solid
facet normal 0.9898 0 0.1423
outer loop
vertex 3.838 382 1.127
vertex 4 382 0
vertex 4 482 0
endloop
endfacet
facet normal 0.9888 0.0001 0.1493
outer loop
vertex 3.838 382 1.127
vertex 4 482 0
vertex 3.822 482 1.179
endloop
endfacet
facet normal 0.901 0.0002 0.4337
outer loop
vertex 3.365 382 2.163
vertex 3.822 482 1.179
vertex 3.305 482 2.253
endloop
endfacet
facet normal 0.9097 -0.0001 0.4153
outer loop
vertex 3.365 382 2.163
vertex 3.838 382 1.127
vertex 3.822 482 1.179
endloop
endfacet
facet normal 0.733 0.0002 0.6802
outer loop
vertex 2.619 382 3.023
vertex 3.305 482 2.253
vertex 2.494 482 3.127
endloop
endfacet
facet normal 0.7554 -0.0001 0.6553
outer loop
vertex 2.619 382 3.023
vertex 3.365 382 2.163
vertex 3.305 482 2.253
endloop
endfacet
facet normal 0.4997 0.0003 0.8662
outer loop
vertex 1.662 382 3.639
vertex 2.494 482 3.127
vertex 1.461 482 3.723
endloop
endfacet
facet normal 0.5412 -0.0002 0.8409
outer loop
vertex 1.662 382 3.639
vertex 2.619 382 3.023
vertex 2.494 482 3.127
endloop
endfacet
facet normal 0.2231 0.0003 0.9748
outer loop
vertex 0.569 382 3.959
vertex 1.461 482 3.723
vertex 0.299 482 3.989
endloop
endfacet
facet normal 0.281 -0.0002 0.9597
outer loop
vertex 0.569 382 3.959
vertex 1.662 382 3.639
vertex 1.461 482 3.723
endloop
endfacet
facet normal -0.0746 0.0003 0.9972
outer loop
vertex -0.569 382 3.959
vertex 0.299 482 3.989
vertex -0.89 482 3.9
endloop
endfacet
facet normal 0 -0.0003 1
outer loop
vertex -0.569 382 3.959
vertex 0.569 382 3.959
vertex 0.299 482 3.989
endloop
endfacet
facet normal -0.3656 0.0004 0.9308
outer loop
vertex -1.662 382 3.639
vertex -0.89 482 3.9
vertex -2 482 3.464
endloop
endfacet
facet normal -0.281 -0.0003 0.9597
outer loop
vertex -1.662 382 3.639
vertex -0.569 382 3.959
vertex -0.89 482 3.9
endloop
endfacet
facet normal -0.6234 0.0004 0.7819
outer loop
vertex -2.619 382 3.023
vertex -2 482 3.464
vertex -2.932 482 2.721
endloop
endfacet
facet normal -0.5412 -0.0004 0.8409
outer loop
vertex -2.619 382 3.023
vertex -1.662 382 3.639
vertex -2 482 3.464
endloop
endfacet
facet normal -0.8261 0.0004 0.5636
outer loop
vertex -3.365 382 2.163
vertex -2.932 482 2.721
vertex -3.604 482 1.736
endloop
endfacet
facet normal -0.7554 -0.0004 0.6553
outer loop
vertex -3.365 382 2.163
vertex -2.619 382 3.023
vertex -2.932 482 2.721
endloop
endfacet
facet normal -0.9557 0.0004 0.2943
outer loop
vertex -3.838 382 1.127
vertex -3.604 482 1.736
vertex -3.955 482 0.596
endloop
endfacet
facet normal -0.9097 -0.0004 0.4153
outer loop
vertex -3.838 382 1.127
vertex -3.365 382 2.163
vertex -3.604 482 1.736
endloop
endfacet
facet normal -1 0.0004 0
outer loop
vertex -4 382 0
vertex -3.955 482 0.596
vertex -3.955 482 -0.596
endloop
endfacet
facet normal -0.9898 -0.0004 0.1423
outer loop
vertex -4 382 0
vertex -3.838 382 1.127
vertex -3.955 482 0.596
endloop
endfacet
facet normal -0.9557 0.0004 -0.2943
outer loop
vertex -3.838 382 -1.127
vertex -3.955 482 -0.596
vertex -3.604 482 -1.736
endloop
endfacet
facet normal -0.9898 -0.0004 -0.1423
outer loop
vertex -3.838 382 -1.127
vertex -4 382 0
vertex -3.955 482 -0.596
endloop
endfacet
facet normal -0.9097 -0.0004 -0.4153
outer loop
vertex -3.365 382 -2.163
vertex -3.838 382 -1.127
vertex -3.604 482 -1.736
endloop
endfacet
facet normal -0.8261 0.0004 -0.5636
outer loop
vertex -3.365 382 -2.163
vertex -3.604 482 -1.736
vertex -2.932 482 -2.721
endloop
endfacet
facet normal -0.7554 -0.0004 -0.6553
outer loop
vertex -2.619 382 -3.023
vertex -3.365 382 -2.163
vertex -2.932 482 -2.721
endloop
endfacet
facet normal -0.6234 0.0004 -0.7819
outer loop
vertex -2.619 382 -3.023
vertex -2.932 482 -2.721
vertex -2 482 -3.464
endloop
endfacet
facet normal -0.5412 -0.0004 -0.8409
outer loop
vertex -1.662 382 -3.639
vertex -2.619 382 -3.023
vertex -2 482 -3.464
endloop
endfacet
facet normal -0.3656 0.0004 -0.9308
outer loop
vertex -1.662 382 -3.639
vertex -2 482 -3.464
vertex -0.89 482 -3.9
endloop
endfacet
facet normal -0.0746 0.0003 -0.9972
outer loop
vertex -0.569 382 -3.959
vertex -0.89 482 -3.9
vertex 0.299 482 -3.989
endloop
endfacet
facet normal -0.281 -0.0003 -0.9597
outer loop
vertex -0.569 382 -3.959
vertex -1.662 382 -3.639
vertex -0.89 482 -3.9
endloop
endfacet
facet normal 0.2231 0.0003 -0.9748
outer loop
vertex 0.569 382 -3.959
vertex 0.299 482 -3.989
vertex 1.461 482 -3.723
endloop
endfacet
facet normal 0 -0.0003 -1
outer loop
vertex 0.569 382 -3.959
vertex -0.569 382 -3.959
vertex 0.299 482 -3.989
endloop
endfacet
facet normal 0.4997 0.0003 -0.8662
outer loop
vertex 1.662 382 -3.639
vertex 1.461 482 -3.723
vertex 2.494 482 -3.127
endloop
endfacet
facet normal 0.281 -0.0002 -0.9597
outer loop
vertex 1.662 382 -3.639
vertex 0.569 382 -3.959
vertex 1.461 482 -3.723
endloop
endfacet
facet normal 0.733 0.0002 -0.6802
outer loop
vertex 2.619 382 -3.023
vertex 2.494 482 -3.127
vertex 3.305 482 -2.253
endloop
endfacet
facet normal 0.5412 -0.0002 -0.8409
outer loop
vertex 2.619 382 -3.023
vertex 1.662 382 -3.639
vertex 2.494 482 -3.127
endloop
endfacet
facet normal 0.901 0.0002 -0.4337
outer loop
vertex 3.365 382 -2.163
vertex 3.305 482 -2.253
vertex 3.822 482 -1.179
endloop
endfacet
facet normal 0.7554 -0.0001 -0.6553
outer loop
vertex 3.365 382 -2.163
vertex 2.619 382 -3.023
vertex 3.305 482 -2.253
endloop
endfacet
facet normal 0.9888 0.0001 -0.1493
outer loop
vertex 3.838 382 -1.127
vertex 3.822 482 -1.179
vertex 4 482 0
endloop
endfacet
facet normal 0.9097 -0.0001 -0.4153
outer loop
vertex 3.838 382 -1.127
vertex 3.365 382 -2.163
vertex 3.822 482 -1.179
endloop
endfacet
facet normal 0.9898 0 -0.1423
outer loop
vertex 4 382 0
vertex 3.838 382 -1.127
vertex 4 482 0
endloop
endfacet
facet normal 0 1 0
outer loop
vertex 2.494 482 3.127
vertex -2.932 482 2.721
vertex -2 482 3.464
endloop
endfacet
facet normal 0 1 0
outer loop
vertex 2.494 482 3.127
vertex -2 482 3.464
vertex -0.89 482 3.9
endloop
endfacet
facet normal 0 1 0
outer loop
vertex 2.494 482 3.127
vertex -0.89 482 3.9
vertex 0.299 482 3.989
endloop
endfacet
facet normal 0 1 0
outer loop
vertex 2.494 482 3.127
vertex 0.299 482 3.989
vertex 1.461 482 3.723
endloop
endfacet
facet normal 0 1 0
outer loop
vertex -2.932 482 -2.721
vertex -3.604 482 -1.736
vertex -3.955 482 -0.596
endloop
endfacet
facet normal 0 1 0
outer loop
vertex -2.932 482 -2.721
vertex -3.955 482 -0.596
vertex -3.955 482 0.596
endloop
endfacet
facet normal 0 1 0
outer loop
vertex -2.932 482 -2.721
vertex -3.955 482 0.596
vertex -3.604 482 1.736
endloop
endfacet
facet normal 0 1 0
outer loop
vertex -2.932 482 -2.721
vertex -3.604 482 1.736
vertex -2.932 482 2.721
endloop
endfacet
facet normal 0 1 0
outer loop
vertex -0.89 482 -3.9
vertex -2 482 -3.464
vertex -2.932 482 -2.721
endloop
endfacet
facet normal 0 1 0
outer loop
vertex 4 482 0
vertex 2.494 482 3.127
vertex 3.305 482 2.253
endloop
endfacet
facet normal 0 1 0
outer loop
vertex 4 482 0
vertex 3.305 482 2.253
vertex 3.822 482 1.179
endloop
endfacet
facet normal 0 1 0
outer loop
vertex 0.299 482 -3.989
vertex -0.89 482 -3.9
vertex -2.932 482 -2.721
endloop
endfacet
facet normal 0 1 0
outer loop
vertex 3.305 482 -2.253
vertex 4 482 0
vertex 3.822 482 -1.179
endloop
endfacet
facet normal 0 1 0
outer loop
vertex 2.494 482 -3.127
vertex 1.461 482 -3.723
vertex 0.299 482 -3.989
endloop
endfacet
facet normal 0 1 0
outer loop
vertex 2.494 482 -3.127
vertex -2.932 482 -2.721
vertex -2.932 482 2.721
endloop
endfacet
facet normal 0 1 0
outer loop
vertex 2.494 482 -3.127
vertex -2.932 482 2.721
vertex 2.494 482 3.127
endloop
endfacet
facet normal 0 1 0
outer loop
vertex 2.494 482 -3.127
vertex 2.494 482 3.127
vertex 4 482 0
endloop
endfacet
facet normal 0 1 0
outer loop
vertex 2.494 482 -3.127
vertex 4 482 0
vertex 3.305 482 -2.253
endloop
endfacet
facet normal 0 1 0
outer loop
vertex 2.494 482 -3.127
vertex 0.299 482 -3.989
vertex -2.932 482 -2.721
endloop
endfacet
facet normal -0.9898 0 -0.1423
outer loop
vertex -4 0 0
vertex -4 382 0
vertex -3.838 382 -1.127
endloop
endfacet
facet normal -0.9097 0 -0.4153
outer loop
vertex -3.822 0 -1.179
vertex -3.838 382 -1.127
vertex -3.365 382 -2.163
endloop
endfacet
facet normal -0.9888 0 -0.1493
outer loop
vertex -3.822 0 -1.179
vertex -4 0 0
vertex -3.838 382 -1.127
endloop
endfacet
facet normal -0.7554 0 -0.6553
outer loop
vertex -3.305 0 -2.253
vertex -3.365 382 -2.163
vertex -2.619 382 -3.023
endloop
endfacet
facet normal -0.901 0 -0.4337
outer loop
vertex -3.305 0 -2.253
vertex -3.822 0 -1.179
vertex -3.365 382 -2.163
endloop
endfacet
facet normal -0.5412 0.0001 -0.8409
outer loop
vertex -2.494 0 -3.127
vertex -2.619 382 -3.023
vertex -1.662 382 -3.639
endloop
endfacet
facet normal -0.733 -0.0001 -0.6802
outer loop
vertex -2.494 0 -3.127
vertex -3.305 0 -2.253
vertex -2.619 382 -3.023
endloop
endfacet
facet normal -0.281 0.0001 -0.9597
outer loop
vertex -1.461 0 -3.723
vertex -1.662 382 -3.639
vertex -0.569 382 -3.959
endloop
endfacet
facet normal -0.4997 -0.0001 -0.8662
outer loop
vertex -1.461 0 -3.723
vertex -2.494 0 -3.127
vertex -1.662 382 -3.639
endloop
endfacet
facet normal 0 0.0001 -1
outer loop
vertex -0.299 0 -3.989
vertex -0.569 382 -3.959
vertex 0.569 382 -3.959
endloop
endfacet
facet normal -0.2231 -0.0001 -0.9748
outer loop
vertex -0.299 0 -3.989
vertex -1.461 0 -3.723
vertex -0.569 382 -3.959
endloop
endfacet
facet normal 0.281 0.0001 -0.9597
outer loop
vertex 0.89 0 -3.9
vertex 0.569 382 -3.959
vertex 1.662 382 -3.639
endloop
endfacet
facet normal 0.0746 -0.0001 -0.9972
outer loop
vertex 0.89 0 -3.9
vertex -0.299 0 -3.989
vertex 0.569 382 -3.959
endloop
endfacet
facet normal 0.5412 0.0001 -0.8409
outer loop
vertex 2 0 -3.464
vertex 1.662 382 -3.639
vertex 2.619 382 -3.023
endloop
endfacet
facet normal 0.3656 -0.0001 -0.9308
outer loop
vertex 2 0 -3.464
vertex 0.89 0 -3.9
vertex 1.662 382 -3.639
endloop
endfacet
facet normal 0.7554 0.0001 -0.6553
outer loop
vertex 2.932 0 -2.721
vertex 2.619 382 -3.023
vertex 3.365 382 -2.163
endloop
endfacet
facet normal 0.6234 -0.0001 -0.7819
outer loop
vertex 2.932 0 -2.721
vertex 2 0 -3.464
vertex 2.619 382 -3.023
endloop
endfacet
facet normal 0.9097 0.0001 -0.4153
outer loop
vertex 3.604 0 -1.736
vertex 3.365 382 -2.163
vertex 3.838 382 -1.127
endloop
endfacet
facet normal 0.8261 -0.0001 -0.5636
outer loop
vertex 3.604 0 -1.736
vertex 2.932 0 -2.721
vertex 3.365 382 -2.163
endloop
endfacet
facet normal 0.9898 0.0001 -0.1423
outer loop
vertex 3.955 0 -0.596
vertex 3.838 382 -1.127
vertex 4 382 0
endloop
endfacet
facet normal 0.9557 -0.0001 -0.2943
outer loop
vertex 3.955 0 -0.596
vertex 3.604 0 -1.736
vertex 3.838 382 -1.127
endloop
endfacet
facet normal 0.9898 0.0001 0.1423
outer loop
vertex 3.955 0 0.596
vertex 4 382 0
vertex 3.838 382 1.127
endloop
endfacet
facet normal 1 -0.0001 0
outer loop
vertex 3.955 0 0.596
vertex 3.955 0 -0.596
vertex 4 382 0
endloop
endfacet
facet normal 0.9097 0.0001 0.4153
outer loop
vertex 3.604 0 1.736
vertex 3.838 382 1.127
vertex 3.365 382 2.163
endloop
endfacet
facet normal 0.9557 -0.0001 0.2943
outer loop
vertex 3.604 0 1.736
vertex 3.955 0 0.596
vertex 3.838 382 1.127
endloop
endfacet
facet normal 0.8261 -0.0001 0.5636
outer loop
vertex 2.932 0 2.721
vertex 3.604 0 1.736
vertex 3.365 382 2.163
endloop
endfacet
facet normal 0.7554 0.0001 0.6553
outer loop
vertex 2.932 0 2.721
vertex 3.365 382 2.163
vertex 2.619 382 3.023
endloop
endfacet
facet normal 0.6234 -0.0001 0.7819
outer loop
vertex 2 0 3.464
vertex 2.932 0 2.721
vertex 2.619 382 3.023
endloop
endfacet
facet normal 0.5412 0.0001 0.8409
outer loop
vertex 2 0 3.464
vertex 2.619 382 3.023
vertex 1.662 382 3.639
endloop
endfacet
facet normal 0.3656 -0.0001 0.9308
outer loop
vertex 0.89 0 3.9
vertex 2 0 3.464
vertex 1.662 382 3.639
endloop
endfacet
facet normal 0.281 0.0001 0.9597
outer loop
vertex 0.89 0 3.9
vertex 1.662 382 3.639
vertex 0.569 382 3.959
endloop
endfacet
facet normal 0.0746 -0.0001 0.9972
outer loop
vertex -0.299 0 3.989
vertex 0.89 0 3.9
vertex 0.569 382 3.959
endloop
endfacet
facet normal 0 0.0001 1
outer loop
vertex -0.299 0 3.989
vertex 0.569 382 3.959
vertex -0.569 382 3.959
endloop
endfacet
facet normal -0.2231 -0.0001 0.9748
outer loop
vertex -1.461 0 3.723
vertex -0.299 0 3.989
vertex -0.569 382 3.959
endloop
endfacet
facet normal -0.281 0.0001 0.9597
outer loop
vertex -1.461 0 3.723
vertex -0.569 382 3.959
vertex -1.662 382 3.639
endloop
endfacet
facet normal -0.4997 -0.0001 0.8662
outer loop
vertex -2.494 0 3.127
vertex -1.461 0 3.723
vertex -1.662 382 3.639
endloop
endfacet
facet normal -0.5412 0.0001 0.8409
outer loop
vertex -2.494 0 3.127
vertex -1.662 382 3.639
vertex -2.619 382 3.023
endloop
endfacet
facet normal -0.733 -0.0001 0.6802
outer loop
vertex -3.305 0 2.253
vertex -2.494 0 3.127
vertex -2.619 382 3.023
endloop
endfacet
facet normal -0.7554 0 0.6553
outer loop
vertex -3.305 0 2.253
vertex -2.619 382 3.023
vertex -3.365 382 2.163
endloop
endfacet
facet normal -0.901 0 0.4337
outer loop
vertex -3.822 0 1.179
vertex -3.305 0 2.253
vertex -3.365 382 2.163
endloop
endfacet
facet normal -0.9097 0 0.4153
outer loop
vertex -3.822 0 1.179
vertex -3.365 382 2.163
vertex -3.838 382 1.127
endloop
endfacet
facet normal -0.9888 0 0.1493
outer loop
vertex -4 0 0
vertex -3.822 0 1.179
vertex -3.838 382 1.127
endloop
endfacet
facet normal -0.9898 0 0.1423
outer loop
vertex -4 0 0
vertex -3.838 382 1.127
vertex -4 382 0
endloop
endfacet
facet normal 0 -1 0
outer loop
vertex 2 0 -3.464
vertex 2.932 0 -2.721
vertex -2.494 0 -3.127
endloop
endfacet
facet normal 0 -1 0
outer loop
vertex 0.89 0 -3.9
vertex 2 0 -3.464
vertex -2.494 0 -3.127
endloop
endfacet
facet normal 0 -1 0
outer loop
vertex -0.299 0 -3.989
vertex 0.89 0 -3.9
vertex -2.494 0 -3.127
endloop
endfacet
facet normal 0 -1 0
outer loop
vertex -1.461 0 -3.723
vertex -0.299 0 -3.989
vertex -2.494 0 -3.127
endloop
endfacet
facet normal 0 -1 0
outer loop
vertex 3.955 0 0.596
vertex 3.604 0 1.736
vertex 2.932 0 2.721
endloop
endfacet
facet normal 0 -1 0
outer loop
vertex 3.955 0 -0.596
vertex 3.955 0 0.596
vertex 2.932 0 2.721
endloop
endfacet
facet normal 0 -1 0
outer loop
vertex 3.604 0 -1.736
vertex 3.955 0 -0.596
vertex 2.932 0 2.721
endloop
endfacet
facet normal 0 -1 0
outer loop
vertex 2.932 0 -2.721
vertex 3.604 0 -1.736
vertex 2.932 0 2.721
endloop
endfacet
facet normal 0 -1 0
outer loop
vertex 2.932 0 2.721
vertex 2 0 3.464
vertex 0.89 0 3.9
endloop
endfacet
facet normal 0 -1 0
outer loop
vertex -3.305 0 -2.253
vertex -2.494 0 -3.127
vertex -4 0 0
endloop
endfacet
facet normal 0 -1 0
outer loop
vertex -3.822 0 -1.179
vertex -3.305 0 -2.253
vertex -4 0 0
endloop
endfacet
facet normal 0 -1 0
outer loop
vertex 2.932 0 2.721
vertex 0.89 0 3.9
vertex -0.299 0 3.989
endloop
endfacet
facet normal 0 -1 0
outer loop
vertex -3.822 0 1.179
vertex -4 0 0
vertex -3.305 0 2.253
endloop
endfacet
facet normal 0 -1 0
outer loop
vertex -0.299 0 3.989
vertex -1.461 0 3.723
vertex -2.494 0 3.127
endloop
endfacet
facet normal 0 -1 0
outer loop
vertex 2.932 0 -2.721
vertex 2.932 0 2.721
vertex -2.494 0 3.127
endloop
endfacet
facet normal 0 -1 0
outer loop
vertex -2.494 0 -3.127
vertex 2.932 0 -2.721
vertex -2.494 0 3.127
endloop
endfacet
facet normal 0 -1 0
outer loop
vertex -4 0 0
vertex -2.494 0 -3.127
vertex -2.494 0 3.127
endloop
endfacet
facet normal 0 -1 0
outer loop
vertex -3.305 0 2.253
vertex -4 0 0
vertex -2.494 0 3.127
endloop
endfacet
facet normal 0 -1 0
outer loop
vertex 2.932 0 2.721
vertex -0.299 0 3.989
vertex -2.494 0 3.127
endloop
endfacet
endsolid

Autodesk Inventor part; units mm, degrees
ref_plane "YZ Plane" through (0, 0, 0) normal (1, 0, 0) x (0, 1, 0)
ref_plane "XZ Plane" through (0, 0, 0) normal (0, 1, 0) x (-1, 0, 0)
ref_plane "XY Plane" through (0, 0, 0) normal (0, 0, 1) x (1, 0, 0)
sketch "Sketch1" plane through (0, 0, 0) normal (0, 1, 0) x (-1, 0, 0)
  circle A0 centre (0, 0) radius 4
  dimension "d0" = 8
extrude "Extrusion1" add sketch "Sketch1" along normal blind 400
sketch "Sketch2" plane through (0, 400, 0) normal (0, 1, 0) x (1, 0, 0)
  circle A0 centre (0, 0) radius 4
  dimension "d3" = 8
extrude "Extrusion2" cut sketch "Sketch2" against normal blind 18
sketch "Sketch3" plane through (0, 382, 0) normal (0, 1, 0) x (1, 0, 0)
  circle A0 centre (0, 0) radius 4
  dimension "d6" = 8
extrude "Extrusion3" add sketch "Sketch3" along normal blind 100
properties part number "e_lead"
